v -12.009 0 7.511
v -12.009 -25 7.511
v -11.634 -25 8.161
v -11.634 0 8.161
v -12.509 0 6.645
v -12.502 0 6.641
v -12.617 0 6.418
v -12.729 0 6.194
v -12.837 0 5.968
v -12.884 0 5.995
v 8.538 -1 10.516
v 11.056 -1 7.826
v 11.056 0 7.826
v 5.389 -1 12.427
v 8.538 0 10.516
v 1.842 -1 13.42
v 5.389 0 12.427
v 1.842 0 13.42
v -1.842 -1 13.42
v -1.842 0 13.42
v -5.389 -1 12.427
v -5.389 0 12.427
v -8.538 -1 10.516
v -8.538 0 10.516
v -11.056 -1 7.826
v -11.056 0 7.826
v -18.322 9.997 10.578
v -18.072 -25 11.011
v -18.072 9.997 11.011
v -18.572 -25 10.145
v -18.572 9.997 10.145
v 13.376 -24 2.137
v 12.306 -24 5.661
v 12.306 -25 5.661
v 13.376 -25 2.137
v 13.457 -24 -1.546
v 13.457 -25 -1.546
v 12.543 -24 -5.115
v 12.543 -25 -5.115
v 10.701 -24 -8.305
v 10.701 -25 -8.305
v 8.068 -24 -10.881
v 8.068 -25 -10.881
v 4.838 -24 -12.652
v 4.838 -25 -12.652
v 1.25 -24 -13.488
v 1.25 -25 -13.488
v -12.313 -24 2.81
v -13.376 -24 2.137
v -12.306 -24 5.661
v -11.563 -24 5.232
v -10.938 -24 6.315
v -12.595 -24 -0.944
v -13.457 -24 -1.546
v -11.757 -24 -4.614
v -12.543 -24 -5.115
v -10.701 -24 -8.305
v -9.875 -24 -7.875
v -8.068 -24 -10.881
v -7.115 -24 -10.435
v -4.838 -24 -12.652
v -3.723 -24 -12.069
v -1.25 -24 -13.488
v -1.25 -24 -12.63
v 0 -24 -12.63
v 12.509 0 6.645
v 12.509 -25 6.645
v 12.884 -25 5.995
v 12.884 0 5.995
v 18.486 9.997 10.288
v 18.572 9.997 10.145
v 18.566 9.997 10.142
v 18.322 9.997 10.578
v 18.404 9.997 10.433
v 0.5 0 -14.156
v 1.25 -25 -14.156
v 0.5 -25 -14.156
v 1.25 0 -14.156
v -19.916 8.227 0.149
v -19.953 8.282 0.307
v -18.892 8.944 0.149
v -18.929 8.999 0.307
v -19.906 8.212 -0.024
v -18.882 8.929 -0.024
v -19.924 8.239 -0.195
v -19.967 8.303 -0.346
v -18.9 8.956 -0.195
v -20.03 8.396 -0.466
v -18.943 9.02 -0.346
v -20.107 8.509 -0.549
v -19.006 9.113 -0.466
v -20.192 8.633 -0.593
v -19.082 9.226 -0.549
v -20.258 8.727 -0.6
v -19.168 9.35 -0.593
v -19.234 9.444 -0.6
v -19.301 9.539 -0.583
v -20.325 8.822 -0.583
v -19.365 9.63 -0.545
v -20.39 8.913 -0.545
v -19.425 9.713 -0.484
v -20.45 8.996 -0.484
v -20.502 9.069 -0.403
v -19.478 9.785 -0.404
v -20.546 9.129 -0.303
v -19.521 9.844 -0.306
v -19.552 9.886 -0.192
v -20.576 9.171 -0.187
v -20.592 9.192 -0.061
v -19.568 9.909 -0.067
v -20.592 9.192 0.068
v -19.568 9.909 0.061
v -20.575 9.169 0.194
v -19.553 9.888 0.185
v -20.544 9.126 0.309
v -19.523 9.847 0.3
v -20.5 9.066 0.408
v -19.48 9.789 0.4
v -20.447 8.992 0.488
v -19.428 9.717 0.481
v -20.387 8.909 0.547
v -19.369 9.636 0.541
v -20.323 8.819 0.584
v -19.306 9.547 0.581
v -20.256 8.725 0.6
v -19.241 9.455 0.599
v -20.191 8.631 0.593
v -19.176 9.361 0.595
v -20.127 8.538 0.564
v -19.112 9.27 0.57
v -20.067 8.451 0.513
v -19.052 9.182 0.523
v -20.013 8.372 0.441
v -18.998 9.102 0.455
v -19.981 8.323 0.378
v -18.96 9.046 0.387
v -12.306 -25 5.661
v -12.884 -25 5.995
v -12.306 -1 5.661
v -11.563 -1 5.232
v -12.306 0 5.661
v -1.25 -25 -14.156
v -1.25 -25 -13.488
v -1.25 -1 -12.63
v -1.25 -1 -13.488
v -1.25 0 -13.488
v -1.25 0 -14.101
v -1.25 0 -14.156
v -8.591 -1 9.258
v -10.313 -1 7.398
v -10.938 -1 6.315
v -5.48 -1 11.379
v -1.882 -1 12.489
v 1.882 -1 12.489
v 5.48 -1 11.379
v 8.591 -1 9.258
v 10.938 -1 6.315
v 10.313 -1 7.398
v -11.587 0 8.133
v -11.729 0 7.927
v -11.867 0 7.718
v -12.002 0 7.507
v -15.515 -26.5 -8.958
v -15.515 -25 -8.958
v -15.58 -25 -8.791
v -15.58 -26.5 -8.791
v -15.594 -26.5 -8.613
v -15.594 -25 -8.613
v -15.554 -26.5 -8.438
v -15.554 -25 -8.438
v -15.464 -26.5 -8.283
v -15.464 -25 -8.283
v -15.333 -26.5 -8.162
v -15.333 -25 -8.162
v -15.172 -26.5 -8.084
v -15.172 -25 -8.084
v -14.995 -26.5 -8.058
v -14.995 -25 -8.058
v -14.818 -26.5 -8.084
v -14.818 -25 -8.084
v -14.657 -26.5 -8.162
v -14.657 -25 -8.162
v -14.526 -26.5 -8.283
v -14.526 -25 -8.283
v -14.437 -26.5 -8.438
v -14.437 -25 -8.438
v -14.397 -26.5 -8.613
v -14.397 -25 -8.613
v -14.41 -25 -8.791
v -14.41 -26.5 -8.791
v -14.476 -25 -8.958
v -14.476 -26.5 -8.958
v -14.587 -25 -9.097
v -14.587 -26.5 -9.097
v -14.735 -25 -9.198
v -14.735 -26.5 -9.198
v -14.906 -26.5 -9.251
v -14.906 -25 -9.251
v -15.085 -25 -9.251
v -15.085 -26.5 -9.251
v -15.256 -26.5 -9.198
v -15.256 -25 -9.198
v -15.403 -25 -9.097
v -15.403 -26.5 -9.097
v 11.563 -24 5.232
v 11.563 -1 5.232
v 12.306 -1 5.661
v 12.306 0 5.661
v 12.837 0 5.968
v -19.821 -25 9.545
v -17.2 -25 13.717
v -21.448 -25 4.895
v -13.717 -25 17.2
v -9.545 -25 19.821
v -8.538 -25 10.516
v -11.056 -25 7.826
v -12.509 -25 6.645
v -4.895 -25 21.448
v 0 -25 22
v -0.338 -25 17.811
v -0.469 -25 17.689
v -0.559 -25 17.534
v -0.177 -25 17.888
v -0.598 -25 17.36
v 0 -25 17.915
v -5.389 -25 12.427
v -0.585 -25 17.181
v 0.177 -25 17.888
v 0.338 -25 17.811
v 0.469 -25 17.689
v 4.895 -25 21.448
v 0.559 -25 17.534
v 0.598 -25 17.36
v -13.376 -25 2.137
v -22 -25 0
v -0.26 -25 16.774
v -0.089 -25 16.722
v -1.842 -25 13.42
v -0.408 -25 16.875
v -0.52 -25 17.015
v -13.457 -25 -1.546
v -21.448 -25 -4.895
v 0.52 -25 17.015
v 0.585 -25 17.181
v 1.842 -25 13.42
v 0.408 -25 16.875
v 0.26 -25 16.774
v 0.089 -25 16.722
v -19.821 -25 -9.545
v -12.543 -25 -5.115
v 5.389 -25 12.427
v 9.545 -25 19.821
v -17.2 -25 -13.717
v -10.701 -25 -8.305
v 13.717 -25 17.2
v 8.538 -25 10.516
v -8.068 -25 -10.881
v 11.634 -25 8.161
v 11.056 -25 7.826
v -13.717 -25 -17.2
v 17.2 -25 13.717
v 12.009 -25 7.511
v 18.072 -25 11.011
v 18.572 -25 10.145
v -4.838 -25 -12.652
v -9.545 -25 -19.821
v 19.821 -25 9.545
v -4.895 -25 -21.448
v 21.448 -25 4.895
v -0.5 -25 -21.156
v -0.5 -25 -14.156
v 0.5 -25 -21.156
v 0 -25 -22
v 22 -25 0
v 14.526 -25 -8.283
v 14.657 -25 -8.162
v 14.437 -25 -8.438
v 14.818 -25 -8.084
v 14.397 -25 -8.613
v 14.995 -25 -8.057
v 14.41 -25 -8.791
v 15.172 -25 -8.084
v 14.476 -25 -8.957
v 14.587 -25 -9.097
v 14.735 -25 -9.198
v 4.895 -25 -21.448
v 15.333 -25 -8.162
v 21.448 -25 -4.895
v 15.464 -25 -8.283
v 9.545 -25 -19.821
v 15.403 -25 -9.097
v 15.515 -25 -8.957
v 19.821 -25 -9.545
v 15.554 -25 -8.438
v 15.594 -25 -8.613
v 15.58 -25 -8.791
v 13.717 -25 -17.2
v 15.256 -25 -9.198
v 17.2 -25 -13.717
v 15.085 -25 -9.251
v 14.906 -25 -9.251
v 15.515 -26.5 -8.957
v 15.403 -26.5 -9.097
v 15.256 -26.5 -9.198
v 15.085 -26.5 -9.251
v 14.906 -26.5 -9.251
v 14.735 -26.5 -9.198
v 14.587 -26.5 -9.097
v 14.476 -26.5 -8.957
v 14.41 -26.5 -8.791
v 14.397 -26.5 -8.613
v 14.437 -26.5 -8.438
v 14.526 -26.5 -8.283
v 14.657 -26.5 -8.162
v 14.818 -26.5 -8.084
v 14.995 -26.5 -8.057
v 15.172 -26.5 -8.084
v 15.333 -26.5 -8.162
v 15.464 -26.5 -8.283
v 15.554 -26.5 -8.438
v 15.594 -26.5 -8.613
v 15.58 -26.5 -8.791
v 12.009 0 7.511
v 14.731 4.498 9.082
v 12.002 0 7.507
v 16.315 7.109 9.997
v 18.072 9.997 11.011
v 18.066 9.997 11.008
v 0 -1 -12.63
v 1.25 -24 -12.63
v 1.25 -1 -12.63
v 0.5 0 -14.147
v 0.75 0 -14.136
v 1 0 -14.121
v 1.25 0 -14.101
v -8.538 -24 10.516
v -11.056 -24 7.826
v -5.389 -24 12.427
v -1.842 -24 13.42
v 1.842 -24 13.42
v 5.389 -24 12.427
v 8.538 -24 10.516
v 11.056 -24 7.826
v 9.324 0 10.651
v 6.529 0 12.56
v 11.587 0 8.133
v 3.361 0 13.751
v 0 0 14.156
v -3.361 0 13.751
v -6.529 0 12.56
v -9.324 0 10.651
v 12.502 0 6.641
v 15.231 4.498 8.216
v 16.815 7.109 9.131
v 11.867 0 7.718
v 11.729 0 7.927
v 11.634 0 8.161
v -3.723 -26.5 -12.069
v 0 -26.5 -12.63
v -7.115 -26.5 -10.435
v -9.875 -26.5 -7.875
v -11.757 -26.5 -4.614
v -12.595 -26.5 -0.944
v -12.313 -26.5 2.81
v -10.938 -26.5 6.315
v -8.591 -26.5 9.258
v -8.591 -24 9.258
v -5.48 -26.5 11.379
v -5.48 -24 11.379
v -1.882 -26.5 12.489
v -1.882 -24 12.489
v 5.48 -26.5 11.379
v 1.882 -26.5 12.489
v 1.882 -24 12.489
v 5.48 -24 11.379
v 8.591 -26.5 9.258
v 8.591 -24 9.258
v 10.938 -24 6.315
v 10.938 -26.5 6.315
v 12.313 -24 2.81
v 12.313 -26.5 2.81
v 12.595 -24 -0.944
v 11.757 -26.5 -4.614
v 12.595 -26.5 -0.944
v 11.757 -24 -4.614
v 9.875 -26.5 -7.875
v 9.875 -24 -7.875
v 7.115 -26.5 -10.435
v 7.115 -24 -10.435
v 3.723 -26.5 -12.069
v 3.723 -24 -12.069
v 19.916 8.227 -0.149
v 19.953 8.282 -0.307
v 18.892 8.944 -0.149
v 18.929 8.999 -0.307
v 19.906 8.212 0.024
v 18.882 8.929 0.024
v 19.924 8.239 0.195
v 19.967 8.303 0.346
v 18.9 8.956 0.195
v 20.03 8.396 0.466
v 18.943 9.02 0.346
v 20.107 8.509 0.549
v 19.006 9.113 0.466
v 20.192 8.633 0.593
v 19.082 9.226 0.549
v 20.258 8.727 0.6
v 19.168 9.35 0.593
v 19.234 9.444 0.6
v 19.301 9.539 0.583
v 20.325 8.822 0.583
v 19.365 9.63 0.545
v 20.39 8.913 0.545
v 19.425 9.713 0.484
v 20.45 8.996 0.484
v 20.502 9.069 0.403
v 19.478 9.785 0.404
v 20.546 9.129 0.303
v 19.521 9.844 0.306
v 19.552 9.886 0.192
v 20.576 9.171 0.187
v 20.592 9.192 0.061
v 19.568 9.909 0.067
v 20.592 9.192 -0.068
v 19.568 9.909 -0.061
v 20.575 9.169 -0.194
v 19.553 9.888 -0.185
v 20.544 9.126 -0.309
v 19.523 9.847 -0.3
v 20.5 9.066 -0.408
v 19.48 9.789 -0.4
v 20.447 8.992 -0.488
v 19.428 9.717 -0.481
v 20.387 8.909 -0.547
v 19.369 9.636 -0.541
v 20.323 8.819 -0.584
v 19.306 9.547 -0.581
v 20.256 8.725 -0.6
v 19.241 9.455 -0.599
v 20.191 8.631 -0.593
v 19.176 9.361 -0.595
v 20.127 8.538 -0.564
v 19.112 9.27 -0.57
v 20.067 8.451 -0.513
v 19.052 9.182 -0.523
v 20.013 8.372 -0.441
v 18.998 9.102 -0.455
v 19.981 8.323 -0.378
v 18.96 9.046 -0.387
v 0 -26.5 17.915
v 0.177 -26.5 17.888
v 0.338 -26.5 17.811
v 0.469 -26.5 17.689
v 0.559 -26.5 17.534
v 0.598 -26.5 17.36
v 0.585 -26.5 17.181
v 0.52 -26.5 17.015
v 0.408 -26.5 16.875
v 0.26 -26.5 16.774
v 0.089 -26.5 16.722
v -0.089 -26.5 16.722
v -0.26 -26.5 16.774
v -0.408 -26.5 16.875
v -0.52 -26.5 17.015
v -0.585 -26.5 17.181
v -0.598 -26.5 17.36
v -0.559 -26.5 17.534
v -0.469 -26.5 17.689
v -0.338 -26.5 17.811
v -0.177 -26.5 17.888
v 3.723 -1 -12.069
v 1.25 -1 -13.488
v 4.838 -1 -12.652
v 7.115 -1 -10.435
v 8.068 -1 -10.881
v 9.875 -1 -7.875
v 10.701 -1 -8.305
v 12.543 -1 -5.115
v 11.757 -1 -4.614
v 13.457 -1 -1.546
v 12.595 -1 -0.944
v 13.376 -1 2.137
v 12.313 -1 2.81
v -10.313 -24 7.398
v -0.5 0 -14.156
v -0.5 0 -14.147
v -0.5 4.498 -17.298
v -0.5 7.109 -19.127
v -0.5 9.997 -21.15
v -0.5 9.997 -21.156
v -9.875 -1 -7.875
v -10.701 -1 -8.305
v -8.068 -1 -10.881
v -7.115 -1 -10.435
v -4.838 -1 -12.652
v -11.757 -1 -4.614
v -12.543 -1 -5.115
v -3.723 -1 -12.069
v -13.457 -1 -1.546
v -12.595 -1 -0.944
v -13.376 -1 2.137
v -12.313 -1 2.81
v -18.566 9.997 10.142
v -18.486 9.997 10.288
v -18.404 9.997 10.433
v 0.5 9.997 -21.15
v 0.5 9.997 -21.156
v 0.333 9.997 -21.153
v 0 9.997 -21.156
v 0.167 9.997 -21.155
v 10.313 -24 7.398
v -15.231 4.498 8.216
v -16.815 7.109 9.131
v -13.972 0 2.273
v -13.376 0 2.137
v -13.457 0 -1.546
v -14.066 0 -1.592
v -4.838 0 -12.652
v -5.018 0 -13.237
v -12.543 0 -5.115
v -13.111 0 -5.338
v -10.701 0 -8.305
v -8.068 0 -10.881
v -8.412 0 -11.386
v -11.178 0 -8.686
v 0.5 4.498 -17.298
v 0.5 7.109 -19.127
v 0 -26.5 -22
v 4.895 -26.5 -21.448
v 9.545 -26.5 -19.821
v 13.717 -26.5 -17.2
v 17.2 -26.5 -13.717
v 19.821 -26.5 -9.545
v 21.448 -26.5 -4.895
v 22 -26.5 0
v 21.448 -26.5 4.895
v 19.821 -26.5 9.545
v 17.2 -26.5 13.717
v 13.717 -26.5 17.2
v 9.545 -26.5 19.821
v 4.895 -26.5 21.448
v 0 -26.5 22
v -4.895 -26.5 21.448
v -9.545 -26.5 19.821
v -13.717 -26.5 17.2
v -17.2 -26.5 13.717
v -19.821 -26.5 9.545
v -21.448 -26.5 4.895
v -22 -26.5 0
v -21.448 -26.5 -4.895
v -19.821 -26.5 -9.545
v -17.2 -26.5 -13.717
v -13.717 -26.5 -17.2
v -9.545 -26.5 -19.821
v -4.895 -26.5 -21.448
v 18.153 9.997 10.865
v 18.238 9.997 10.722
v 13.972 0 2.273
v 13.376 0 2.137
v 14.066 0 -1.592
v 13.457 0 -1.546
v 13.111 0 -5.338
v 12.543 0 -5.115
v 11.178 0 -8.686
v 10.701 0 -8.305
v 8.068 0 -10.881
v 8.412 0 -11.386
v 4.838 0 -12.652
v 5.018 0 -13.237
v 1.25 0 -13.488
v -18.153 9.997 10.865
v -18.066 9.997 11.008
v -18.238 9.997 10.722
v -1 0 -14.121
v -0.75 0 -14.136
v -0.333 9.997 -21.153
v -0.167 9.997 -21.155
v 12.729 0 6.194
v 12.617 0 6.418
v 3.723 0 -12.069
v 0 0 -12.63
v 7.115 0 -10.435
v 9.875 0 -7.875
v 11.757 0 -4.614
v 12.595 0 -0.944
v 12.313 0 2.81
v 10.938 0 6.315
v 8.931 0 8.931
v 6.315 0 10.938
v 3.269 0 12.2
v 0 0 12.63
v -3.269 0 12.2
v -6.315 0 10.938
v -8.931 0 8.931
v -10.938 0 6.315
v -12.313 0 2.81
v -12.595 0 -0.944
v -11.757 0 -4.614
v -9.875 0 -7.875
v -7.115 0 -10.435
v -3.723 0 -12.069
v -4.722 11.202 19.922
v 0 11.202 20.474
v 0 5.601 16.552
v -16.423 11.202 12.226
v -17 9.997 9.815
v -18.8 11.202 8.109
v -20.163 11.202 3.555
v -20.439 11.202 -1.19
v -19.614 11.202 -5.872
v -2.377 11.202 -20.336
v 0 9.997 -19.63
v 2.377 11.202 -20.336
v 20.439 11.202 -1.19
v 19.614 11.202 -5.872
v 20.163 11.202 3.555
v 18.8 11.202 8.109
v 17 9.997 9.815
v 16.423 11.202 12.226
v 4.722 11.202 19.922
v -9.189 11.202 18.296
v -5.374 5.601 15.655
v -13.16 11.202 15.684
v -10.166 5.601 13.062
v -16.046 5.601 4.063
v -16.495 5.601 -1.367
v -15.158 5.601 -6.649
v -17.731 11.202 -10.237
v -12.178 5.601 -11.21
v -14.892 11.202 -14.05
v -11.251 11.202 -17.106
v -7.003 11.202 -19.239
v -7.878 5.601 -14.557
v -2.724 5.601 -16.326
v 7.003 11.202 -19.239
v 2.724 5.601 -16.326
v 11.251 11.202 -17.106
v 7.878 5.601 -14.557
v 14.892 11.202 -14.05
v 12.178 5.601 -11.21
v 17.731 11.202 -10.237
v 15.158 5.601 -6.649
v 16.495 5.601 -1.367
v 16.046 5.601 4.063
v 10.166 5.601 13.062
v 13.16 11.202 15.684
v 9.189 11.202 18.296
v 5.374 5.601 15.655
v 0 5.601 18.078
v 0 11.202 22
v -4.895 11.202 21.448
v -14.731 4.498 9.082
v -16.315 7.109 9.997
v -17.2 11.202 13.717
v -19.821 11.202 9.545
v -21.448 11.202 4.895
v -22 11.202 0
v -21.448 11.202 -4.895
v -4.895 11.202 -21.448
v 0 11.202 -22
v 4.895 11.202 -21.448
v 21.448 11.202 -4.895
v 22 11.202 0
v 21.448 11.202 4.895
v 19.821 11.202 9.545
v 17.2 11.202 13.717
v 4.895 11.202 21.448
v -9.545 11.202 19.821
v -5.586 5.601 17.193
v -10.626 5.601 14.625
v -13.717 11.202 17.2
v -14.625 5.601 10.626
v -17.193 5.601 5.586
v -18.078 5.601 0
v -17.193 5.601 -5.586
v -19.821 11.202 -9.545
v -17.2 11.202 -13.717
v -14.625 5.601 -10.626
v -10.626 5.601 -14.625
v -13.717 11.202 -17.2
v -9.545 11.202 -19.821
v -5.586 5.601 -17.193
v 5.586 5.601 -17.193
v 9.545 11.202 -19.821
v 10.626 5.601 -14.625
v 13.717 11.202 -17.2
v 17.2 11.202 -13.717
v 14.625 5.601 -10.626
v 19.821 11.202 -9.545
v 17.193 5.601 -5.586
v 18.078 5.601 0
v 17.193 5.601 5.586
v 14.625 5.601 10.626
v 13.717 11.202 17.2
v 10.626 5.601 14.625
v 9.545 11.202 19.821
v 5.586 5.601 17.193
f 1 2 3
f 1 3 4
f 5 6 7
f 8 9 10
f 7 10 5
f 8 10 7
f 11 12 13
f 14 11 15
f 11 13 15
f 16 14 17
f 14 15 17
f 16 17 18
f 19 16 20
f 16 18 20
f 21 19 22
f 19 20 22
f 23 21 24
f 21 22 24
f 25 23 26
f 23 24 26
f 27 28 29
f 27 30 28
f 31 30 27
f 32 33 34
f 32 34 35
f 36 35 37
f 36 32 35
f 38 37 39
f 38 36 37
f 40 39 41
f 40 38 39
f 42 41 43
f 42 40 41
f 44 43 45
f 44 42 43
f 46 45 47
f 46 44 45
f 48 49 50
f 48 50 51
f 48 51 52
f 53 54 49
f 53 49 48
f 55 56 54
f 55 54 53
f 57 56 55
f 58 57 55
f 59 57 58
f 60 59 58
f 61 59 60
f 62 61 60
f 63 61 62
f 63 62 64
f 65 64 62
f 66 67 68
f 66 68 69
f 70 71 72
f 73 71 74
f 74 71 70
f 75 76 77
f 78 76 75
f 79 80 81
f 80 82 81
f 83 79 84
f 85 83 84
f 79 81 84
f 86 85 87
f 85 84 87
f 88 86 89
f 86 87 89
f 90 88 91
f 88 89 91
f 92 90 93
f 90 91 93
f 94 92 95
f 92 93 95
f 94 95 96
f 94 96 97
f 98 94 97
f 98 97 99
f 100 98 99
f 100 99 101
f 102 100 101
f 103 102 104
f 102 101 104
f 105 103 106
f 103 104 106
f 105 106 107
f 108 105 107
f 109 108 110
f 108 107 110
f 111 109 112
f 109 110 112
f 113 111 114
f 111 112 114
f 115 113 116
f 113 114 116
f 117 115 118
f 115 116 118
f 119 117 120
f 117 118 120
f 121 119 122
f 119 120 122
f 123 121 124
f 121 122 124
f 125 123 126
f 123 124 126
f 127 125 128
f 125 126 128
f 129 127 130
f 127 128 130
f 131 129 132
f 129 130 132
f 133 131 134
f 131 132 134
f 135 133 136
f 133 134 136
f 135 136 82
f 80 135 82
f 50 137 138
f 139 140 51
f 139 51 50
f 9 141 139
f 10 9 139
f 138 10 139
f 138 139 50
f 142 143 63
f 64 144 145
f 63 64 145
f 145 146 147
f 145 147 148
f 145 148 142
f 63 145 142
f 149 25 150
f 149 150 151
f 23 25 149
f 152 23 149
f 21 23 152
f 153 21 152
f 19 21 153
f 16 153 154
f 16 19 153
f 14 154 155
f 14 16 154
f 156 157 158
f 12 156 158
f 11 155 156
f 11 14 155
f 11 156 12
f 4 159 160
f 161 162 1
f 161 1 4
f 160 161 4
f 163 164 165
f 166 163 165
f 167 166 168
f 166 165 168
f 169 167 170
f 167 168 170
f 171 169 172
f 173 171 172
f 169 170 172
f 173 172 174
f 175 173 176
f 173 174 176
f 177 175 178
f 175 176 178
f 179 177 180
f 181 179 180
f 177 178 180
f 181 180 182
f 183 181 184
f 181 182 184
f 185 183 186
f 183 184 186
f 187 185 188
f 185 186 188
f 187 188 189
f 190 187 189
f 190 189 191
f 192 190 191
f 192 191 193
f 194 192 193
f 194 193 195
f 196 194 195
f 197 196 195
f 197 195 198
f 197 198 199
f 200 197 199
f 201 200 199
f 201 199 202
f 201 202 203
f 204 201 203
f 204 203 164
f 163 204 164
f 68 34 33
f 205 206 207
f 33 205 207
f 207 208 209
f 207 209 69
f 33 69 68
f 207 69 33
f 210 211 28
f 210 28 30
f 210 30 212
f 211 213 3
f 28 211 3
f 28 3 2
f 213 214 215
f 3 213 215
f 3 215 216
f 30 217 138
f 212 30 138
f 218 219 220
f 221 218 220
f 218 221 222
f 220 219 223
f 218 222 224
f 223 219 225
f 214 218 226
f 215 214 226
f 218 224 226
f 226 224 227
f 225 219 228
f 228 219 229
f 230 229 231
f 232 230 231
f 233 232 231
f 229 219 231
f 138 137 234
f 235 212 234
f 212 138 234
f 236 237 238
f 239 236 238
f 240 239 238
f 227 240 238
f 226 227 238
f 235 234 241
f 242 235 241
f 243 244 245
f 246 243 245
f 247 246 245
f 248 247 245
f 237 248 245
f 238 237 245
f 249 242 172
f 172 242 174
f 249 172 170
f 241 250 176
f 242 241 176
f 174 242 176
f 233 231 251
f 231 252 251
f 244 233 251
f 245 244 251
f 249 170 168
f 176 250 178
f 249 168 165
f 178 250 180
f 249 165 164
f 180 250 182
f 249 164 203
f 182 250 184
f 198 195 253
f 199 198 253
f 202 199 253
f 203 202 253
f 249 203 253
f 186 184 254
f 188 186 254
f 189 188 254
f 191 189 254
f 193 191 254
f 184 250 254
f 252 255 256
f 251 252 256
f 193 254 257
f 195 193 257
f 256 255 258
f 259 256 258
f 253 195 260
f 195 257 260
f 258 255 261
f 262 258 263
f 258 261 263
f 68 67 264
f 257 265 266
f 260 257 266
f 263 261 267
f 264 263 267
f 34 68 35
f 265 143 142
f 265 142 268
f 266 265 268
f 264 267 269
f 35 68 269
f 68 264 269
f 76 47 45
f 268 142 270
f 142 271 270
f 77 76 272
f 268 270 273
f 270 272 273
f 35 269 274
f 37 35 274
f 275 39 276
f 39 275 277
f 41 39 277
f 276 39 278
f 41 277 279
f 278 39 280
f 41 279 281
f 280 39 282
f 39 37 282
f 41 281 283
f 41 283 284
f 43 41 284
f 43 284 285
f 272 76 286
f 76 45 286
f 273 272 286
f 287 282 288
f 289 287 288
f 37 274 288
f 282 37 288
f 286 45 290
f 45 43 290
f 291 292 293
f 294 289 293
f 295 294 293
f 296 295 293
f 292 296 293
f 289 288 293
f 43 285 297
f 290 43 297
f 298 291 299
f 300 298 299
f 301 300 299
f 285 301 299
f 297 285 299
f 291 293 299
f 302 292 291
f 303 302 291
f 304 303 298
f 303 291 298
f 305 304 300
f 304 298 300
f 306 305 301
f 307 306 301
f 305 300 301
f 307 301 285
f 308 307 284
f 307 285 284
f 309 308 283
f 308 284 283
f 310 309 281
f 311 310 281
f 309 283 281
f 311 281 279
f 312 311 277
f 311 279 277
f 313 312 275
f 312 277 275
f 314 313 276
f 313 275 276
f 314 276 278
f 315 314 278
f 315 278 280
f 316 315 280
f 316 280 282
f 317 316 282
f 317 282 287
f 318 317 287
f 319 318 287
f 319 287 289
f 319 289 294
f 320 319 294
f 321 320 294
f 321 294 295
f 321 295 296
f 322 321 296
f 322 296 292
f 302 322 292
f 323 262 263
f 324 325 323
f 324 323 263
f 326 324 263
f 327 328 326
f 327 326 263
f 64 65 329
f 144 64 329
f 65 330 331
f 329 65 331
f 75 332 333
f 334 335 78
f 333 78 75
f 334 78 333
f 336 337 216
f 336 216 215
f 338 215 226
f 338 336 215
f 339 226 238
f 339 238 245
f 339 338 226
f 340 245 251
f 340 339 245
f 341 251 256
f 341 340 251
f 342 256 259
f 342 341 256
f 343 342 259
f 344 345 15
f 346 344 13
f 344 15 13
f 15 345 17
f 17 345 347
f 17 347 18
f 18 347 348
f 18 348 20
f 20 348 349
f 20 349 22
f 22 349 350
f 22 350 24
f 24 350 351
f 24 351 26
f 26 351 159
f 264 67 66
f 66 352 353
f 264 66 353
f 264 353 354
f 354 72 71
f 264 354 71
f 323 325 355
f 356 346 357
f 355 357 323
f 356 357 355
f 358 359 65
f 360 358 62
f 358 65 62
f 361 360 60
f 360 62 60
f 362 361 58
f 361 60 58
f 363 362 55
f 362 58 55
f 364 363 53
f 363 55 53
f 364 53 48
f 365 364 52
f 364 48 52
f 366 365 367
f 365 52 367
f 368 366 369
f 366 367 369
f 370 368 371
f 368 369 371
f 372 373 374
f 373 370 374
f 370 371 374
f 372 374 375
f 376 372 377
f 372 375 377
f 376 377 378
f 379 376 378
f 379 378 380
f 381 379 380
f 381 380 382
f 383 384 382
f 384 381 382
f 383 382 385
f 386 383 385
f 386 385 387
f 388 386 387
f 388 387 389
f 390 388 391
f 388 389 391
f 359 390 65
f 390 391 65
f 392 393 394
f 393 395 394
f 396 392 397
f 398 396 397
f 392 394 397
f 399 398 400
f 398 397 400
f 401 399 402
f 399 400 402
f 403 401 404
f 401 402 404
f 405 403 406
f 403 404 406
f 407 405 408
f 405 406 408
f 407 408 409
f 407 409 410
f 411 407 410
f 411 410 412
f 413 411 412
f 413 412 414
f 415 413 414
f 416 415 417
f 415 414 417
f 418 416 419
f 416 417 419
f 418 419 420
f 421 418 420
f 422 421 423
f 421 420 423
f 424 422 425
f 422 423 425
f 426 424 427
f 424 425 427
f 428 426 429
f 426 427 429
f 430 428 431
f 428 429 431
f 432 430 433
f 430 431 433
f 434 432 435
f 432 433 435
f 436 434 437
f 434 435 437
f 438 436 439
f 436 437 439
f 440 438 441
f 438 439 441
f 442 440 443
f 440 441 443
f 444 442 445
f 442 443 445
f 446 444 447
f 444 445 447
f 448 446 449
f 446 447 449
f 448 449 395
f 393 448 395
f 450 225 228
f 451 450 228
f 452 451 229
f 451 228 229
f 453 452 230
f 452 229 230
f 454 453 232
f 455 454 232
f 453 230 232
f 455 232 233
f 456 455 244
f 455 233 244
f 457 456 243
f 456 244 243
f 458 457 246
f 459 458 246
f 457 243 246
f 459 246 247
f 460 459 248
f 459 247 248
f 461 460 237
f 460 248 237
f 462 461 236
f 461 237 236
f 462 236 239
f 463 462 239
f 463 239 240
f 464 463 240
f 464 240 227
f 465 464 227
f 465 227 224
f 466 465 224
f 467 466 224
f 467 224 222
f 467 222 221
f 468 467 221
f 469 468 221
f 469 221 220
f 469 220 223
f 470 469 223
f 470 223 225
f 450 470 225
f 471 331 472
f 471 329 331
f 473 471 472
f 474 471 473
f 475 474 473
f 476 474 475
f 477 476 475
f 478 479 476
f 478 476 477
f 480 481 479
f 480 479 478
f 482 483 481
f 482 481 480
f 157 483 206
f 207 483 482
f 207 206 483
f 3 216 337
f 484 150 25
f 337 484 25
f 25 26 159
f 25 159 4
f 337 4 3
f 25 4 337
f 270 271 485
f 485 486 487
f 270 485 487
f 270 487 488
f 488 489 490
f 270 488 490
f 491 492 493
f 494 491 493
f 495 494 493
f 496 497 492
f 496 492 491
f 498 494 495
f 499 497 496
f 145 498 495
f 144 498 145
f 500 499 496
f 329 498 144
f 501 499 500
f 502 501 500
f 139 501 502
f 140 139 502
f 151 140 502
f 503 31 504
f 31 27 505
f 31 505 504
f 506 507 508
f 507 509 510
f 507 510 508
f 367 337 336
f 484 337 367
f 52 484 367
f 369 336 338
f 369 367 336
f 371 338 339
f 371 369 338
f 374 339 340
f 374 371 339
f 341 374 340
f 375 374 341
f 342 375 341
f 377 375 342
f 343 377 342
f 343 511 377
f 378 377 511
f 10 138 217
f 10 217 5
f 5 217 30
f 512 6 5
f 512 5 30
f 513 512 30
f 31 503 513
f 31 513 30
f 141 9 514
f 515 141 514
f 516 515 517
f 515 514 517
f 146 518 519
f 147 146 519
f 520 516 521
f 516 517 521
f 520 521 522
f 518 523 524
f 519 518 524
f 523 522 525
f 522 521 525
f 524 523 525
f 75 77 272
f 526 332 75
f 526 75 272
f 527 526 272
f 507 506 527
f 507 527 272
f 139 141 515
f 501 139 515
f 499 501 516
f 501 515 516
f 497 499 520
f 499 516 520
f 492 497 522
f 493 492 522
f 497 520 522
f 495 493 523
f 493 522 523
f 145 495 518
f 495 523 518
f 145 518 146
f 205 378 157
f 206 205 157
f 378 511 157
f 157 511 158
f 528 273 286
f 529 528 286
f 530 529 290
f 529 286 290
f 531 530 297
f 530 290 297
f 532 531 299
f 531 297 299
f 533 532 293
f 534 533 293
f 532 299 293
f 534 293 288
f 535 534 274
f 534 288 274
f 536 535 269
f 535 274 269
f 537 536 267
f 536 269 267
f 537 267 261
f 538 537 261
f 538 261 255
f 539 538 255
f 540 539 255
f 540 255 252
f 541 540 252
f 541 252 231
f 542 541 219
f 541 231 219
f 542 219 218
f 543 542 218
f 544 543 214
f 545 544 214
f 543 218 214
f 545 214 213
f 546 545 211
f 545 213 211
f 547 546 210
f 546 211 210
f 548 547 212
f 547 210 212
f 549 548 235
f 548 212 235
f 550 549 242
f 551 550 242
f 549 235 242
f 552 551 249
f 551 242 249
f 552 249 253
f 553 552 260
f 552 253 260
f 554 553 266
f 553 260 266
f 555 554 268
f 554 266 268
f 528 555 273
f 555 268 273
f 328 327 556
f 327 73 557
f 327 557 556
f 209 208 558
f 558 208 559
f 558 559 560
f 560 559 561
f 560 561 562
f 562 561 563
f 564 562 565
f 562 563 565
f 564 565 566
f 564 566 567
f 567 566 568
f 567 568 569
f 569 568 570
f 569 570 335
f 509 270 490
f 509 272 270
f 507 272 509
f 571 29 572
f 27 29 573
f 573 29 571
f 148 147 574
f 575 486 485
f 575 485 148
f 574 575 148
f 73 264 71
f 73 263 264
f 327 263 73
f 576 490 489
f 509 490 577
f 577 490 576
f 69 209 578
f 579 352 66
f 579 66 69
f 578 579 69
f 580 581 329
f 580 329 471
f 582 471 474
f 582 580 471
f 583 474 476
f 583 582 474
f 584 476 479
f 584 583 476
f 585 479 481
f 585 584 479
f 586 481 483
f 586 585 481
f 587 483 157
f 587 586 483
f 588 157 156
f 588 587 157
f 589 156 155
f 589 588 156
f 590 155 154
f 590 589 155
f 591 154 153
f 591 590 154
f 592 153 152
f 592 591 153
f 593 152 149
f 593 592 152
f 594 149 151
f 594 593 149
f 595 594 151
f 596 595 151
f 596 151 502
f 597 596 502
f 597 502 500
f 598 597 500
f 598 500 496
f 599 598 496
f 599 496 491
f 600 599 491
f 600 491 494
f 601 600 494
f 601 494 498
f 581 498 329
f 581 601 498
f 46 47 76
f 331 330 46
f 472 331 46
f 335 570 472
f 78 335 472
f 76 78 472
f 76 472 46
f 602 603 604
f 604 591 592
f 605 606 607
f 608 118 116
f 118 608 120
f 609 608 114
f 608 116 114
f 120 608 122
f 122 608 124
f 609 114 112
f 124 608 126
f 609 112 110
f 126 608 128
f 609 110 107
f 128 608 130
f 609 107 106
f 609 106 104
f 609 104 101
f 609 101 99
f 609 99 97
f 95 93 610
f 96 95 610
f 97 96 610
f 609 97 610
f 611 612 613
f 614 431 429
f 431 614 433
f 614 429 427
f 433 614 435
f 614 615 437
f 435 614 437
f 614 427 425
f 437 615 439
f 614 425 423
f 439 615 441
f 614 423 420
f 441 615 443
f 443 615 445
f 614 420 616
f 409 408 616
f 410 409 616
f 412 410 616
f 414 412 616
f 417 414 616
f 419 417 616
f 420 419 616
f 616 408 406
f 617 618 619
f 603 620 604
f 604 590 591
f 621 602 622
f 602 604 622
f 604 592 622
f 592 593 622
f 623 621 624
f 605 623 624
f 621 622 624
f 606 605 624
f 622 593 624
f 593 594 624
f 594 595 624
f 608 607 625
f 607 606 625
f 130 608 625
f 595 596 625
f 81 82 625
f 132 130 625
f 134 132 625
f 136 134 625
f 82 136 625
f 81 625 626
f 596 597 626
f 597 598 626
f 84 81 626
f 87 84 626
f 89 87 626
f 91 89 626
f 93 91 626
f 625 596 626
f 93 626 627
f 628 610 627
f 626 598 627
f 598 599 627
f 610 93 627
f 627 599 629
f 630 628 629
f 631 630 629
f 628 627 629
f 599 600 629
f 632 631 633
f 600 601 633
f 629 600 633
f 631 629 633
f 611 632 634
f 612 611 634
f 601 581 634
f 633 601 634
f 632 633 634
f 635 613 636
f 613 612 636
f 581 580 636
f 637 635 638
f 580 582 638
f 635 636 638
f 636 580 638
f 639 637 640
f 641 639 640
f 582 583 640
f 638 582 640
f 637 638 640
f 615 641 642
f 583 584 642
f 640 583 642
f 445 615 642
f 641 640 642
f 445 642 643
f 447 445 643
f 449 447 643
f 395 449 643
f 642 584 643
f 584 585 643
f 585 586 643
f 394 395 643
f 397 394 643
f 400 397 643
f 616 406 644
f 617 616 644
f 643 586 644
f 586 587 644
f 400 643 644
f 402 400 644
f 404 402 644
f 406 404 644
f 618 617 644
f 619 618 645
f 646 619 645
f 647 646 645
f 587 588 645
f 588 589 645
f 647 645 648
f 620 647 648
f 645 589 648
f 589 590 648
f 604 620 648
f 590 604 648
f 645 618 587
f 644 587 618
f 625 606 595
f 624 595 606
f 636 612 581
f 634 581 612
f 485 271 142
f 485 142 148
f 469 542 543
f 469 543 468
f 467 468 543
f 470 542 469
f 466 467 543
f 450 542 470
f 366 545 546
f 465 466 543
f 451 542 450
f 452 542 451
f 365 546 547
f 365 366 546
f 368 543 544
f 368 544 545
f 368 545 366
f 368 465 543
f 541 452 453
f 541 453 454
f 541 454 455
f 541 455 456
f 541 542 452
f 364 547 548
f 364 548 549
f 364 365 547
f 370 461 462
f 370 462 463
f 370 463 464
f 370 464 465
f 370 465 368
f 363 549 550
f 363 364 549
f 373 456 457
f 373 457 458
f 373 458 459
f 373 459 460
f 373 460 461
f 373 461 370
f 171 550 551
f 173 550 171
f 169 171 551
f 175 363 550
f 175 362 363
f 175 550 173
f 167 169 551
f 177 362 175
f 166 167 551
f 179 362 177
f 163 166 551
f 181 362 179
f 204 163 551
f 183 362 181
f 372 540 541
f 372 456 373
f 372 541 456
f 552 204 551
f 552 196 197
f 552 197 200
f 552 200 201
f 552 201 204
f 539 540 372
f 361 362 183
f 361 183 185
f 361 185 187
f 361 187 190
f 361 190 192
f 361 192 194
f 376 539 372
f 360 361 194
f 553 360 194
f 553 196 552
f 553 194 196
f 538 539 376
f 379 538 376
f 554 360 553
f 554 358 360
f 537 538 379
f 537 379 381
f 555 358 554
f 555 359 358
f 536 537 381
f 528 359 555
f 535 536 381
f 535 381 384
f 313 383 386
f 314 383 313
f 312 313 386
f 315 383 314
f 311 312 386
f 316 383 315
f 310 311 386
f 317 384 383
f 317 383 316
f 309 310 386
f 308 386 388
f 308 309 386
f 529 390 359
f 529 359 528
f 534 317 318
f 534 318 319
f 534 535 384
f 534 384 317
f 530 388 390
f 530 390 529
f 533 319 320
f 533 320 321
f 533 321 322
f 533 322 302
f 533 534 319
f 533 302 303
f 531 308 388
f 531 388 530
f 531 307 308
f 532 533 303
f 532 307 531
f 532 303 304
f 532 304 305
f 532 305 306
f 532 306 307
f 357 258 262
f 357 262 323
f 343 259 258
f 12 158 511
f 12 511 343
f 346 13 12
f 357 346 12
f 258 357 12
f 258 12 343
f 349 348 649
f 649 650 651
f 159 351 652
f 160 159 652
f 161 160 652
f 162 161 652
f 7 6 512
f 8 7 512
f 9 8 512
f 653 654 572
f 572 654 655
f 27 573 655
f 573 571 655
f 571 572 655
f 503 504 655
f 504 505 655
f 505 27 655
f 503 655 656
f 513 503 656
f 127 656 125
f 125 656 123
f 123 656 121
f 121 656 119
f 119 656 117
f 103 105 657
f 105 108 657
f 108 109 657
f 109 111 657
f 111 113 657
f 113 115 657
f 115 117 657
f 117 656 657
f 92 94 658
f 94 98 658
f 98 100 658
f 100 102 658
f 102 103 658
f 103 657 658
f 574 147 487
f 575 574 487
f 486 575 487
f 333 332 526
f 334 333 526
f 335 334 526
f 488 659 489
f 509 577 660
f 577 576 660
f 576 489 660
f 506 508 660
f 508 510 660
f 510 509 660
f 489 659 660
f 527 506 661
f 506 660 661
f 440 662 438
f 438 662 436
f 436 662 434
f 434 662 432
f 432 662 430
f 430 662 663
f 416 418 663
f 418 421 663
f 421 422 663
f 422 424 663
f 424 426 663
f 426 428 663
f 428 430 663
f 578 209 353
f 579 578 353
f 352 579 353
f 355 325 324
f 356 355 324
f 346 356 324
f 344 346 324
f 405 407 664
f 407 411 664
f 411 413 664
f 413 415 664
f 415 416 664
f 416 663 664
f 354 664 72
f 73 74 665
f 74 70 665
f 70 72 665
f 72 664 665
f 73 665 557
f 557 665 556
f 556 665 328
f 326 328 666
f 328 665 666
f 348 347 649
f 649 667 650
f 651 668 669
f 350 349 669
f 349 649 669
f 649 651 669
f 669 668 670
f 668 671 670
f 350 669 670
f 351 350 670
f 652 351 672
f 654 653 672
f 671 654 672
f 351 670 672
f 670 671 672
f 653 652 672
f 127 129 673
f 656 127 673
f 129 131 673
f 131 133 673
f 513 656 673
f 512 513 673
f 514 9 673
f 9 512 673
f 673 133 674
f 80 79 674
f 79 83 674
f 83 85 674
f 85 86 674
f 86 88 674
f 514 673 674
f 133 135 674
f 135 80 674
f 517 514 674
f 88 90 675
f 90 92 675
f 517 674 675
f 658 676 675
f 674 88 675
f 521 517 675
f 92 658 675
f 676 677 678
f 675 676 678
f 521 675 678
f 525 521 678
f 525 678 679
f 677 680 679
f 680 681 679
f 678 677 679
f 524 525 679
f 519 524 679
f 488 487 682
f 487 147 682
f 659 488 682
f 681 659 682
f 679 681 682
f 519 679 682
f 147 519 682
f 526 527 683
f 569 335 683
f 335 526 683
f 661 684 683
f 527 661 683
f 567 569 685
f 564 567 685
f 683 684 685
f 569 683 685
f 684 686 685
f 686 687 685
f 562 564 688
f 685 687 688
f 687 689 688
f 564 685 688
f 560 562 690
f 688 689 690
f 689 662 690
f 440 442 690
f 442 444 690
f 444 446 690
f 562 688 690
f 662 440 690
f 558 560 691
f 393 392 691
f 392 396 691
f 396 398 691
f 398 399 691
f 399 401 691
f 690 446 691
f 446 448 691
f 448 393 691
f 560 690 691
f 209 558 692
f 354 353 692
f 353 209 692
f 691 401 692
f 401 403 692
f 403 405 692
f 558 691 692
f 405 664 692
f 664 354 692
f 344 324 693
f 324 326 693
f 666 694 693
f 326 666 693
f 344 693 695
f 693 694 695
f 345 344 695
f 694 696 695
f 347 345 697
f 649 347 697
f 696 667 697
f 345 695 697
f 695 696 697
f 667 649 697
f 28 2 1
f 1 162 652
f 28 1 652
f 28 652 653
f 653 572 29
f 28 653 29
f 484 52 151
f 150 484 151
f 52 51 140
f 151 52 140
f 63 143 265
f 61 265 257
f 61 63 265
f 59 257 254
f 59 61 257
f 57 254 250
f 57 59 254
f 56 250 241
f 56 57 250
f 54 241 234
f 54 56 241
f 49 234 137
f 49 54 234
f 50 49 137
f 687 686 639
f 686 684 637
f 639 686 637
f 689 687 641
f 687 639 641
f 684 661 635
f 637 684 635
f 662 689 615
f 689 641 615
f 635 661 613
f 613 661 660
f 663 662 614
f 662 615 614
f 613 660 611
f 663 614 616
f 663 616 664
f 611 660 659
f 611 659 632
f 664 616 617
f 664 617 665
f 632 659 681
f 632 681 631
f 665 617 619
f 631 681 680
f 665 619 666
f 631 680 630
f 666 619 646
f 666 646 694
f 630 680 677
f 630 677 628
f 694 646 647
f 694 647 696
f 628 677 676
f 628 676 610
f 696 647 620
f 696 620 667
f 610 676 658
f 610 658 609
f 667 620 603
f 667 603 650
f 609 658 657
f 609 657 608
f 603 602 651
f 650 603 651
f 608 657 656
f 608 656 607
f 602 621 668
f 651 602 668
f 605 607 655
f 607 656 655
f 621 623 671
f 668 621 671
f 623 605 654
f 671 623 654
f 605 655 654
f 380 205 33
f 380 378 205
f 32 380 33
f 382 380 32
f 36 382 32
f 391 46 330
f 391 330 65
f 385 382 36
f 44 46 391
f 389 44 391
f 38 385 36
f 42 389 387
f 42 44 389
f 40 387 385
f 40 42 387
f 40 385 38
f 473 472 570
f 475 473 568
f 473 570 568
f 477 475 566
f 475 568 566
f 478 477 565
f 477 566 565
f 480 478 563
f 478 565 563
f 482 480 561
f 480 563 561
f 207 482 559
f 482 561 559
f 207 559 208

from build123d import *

# Parameters (mm, degrees)
SKETCH36_R          = 0.6
SIDE_HOLES_DEPTH    = 2
CIRPATTERN2_COUNT   = 2
SKETCH38_W          = 1.525968236
SKETCH38_H          = 25
BOSS_EXTRUDE5_DEPTH = 1.25
BOSS_EXTRUDE6_DEPTH = 0.5
CIRPATTERN3_COUNT   = 3
SKETCH39_R          = 22
SKETCH39_R_2        = 12.63
BOSS_EXTRUDE7_DEPTH = 1.5
SKETCH40_R          = 0.6
CUT_EXTRUDE1_DEPTH  = 48.734856834
CIRPATTERN4_COUNT   = 3
BOSS_EXTRUDE8_START = 1
SKETCH41_R          = 13.545580942
SKETCH41_R_2        = 12.63
BOSS_EXTRUDE8_DEPTH = 1
SKETCH42_R          = 13.545580942
SKETCH42_R_2        = 12.63
BOSS_EXTRUDE9_DEPTH = 1


with BuildPart() as part:
    # Sketch35 → Revolve1 (revolve)
    with BuildSketch(Plane.XY, mode=Mode.PRIVATE) as revolve1_sk:
        Polygon((20.474031764, 11.202438329), (12.63, 0), (14.155968236, 0), (22, 11.202438329), align=None)
    revolve(revolve1_sk.sketch.rotate(Axis((0, 11.202438329, 0), (0, -1, 0)), 90), axis=Axis((0, 11.202438329, 0), (0, -1, 0)))

    # Sketch36 → side-holes (cut, symmetric)
    with BuildSketch(Plane(origin=(8.474857205, -5.9341589, 0), x_dir=(0, 0, 1), z_dir=(-0.8191520442889934, 0.5735764363510439, 0))):
        with Locations(Location((0, 18.744270391, 0), (0, 0, 239.229798776))):
            Circle(SKETCH36_R)
    side_holes = extrude(amount=SIDE_HOLES_DEPTH, both=True, mode=Mode.SUBTRACT)

    # CirPattern2: side-holes ×2 about axis
    cirpattern2_axis = Axis((0, 0, 0), (0, 1, 0))
    for i in range(1, CIRPATTERN2_COUNT):
        add(side_holes.rotate(cirpattern2_axis, i * 360 / CIRPATTERN2_COUNT), mode=Mode.SUBTRACT)

    # Sketch38 → Boss-Extrude5 (add, symmetric)
    with BuildSketch(Plane(origin=(0, 0, 0), x_dir=(0, 0, -1), z_dir=(1, 0, 0))):
        with Locations((13.392984118, -12.5)):
            Rectangle(SKETCH38_W, SKETCH38_H)
    boss_extrude5 = extrude(amount=BOSS_EXTRUDE5_DEPTH, both=True)

    # Sketch38<6> → Boss-Extrude6 (add, symmetric)
    with BuildSketch(Plane(origin=(0, 0, 0), x_dir=(0, 0, -1), z_dir=(1, 0, 0))):
        Polygon((19.63, 9.997036047), (12.63, 0), (14.155968236, 0), (14.155968236, -25), (21.155968236, -25), (21.155968236, 9.997036047), align=None)
    boss_extrude6 = extrude(amount=BOSS_EXTRUDE6_DEPTH, both=True)

    # CirPattern3: Boss-Extrude5, Boss-Extrude6 ×3 about axis
    cirpattern3_axis = Axis((0, 0, 0), (0, 1, 0))
    add([boss_extrude5.rotate(cirpattern3_axis, i * 360 / CIRPATTERN3_COUNT) for i in range(1, CIRPATTERN3_COUNT)])
    add([boss_extrude6.rotate(cirpattern3_axis, i * 360 / CIRPATTERN3_COUNT) for i in range(1, CIRPATTERN3_COUNT)])

    # Sketch39 → Boss-Extrude7 (add)
    with BuildSketch(Plane.XZ.offset(25)):
        with Locations(Location((0, 0, 0), (0, 0, 270))):
            Circle(SKETCH39_R)
        with Locations(Location((0, 0, 0), (0, 0, 270))):
            Circle(SKETCH39_R_2, mode=Mode.SUBTRACT)
    extrude(amount=BOSS_EXTRUDE7_DEPTH)

    # Sketch40 → Cut-Extrude1 (cut, through all)
    with BuildSketch(Plane(origin=(0, -25, 0), x_dir=(1, 0, 0), z_dir=(0, 1, 0))):
        with Locations(Location((0, -17.315, 0), (0, 0, 270))):
            Circle(SKETCH40_R)
    cut_extrude1 = extrude(amount=-CUT_EXTRUDE1_DEPTH, mode=Mode.SUBTRACT)

    # CirPattern4: Cut-Extrude1 ×3 about axis
    cirpattern4_axis = Axis((0, 0, 0), (0, 1, 0))
    for i in range(1, CIRPATTERN4_COUNT):
        add(cut_extrude1.rotate(cirpattern4_axis, i * 360 / CIRPATTERN4_COUNT), mode=Mode.SUBTRACT)

    # Sketch41 → Boss-Extrude8 (add)
    with BuildSketch(Plane(origin=(0, -25, 0), x_dir=(1, 0, 0), z_dir=(0, 1, 0)).offset(BOSS_EXTRUDE8_START)):
        Circle(SKETCH41_R)
        with Locations(Location((0, 0, 0), (0, 0, 90))):
            Circle(SKETCH41_R_2, mode=Mode.SUBTRACT)
    extrude(amount=-BOSS_EXTRUDE8_DEPTH)

    # Sketch42 → Boss-Extrude9 (add)
    with BuildSketch(Plane.XZ):
        Circle(SKETCH42_R)
        with Locations(Location((0, 0, 0), (0, 0, 270))):
            Circle(SKETCH42_R_2, mode=Mode.SUBTRACT)
    extrude(amount=BOSS_EXTRUDE9_DEPTH)


solid = part.part
